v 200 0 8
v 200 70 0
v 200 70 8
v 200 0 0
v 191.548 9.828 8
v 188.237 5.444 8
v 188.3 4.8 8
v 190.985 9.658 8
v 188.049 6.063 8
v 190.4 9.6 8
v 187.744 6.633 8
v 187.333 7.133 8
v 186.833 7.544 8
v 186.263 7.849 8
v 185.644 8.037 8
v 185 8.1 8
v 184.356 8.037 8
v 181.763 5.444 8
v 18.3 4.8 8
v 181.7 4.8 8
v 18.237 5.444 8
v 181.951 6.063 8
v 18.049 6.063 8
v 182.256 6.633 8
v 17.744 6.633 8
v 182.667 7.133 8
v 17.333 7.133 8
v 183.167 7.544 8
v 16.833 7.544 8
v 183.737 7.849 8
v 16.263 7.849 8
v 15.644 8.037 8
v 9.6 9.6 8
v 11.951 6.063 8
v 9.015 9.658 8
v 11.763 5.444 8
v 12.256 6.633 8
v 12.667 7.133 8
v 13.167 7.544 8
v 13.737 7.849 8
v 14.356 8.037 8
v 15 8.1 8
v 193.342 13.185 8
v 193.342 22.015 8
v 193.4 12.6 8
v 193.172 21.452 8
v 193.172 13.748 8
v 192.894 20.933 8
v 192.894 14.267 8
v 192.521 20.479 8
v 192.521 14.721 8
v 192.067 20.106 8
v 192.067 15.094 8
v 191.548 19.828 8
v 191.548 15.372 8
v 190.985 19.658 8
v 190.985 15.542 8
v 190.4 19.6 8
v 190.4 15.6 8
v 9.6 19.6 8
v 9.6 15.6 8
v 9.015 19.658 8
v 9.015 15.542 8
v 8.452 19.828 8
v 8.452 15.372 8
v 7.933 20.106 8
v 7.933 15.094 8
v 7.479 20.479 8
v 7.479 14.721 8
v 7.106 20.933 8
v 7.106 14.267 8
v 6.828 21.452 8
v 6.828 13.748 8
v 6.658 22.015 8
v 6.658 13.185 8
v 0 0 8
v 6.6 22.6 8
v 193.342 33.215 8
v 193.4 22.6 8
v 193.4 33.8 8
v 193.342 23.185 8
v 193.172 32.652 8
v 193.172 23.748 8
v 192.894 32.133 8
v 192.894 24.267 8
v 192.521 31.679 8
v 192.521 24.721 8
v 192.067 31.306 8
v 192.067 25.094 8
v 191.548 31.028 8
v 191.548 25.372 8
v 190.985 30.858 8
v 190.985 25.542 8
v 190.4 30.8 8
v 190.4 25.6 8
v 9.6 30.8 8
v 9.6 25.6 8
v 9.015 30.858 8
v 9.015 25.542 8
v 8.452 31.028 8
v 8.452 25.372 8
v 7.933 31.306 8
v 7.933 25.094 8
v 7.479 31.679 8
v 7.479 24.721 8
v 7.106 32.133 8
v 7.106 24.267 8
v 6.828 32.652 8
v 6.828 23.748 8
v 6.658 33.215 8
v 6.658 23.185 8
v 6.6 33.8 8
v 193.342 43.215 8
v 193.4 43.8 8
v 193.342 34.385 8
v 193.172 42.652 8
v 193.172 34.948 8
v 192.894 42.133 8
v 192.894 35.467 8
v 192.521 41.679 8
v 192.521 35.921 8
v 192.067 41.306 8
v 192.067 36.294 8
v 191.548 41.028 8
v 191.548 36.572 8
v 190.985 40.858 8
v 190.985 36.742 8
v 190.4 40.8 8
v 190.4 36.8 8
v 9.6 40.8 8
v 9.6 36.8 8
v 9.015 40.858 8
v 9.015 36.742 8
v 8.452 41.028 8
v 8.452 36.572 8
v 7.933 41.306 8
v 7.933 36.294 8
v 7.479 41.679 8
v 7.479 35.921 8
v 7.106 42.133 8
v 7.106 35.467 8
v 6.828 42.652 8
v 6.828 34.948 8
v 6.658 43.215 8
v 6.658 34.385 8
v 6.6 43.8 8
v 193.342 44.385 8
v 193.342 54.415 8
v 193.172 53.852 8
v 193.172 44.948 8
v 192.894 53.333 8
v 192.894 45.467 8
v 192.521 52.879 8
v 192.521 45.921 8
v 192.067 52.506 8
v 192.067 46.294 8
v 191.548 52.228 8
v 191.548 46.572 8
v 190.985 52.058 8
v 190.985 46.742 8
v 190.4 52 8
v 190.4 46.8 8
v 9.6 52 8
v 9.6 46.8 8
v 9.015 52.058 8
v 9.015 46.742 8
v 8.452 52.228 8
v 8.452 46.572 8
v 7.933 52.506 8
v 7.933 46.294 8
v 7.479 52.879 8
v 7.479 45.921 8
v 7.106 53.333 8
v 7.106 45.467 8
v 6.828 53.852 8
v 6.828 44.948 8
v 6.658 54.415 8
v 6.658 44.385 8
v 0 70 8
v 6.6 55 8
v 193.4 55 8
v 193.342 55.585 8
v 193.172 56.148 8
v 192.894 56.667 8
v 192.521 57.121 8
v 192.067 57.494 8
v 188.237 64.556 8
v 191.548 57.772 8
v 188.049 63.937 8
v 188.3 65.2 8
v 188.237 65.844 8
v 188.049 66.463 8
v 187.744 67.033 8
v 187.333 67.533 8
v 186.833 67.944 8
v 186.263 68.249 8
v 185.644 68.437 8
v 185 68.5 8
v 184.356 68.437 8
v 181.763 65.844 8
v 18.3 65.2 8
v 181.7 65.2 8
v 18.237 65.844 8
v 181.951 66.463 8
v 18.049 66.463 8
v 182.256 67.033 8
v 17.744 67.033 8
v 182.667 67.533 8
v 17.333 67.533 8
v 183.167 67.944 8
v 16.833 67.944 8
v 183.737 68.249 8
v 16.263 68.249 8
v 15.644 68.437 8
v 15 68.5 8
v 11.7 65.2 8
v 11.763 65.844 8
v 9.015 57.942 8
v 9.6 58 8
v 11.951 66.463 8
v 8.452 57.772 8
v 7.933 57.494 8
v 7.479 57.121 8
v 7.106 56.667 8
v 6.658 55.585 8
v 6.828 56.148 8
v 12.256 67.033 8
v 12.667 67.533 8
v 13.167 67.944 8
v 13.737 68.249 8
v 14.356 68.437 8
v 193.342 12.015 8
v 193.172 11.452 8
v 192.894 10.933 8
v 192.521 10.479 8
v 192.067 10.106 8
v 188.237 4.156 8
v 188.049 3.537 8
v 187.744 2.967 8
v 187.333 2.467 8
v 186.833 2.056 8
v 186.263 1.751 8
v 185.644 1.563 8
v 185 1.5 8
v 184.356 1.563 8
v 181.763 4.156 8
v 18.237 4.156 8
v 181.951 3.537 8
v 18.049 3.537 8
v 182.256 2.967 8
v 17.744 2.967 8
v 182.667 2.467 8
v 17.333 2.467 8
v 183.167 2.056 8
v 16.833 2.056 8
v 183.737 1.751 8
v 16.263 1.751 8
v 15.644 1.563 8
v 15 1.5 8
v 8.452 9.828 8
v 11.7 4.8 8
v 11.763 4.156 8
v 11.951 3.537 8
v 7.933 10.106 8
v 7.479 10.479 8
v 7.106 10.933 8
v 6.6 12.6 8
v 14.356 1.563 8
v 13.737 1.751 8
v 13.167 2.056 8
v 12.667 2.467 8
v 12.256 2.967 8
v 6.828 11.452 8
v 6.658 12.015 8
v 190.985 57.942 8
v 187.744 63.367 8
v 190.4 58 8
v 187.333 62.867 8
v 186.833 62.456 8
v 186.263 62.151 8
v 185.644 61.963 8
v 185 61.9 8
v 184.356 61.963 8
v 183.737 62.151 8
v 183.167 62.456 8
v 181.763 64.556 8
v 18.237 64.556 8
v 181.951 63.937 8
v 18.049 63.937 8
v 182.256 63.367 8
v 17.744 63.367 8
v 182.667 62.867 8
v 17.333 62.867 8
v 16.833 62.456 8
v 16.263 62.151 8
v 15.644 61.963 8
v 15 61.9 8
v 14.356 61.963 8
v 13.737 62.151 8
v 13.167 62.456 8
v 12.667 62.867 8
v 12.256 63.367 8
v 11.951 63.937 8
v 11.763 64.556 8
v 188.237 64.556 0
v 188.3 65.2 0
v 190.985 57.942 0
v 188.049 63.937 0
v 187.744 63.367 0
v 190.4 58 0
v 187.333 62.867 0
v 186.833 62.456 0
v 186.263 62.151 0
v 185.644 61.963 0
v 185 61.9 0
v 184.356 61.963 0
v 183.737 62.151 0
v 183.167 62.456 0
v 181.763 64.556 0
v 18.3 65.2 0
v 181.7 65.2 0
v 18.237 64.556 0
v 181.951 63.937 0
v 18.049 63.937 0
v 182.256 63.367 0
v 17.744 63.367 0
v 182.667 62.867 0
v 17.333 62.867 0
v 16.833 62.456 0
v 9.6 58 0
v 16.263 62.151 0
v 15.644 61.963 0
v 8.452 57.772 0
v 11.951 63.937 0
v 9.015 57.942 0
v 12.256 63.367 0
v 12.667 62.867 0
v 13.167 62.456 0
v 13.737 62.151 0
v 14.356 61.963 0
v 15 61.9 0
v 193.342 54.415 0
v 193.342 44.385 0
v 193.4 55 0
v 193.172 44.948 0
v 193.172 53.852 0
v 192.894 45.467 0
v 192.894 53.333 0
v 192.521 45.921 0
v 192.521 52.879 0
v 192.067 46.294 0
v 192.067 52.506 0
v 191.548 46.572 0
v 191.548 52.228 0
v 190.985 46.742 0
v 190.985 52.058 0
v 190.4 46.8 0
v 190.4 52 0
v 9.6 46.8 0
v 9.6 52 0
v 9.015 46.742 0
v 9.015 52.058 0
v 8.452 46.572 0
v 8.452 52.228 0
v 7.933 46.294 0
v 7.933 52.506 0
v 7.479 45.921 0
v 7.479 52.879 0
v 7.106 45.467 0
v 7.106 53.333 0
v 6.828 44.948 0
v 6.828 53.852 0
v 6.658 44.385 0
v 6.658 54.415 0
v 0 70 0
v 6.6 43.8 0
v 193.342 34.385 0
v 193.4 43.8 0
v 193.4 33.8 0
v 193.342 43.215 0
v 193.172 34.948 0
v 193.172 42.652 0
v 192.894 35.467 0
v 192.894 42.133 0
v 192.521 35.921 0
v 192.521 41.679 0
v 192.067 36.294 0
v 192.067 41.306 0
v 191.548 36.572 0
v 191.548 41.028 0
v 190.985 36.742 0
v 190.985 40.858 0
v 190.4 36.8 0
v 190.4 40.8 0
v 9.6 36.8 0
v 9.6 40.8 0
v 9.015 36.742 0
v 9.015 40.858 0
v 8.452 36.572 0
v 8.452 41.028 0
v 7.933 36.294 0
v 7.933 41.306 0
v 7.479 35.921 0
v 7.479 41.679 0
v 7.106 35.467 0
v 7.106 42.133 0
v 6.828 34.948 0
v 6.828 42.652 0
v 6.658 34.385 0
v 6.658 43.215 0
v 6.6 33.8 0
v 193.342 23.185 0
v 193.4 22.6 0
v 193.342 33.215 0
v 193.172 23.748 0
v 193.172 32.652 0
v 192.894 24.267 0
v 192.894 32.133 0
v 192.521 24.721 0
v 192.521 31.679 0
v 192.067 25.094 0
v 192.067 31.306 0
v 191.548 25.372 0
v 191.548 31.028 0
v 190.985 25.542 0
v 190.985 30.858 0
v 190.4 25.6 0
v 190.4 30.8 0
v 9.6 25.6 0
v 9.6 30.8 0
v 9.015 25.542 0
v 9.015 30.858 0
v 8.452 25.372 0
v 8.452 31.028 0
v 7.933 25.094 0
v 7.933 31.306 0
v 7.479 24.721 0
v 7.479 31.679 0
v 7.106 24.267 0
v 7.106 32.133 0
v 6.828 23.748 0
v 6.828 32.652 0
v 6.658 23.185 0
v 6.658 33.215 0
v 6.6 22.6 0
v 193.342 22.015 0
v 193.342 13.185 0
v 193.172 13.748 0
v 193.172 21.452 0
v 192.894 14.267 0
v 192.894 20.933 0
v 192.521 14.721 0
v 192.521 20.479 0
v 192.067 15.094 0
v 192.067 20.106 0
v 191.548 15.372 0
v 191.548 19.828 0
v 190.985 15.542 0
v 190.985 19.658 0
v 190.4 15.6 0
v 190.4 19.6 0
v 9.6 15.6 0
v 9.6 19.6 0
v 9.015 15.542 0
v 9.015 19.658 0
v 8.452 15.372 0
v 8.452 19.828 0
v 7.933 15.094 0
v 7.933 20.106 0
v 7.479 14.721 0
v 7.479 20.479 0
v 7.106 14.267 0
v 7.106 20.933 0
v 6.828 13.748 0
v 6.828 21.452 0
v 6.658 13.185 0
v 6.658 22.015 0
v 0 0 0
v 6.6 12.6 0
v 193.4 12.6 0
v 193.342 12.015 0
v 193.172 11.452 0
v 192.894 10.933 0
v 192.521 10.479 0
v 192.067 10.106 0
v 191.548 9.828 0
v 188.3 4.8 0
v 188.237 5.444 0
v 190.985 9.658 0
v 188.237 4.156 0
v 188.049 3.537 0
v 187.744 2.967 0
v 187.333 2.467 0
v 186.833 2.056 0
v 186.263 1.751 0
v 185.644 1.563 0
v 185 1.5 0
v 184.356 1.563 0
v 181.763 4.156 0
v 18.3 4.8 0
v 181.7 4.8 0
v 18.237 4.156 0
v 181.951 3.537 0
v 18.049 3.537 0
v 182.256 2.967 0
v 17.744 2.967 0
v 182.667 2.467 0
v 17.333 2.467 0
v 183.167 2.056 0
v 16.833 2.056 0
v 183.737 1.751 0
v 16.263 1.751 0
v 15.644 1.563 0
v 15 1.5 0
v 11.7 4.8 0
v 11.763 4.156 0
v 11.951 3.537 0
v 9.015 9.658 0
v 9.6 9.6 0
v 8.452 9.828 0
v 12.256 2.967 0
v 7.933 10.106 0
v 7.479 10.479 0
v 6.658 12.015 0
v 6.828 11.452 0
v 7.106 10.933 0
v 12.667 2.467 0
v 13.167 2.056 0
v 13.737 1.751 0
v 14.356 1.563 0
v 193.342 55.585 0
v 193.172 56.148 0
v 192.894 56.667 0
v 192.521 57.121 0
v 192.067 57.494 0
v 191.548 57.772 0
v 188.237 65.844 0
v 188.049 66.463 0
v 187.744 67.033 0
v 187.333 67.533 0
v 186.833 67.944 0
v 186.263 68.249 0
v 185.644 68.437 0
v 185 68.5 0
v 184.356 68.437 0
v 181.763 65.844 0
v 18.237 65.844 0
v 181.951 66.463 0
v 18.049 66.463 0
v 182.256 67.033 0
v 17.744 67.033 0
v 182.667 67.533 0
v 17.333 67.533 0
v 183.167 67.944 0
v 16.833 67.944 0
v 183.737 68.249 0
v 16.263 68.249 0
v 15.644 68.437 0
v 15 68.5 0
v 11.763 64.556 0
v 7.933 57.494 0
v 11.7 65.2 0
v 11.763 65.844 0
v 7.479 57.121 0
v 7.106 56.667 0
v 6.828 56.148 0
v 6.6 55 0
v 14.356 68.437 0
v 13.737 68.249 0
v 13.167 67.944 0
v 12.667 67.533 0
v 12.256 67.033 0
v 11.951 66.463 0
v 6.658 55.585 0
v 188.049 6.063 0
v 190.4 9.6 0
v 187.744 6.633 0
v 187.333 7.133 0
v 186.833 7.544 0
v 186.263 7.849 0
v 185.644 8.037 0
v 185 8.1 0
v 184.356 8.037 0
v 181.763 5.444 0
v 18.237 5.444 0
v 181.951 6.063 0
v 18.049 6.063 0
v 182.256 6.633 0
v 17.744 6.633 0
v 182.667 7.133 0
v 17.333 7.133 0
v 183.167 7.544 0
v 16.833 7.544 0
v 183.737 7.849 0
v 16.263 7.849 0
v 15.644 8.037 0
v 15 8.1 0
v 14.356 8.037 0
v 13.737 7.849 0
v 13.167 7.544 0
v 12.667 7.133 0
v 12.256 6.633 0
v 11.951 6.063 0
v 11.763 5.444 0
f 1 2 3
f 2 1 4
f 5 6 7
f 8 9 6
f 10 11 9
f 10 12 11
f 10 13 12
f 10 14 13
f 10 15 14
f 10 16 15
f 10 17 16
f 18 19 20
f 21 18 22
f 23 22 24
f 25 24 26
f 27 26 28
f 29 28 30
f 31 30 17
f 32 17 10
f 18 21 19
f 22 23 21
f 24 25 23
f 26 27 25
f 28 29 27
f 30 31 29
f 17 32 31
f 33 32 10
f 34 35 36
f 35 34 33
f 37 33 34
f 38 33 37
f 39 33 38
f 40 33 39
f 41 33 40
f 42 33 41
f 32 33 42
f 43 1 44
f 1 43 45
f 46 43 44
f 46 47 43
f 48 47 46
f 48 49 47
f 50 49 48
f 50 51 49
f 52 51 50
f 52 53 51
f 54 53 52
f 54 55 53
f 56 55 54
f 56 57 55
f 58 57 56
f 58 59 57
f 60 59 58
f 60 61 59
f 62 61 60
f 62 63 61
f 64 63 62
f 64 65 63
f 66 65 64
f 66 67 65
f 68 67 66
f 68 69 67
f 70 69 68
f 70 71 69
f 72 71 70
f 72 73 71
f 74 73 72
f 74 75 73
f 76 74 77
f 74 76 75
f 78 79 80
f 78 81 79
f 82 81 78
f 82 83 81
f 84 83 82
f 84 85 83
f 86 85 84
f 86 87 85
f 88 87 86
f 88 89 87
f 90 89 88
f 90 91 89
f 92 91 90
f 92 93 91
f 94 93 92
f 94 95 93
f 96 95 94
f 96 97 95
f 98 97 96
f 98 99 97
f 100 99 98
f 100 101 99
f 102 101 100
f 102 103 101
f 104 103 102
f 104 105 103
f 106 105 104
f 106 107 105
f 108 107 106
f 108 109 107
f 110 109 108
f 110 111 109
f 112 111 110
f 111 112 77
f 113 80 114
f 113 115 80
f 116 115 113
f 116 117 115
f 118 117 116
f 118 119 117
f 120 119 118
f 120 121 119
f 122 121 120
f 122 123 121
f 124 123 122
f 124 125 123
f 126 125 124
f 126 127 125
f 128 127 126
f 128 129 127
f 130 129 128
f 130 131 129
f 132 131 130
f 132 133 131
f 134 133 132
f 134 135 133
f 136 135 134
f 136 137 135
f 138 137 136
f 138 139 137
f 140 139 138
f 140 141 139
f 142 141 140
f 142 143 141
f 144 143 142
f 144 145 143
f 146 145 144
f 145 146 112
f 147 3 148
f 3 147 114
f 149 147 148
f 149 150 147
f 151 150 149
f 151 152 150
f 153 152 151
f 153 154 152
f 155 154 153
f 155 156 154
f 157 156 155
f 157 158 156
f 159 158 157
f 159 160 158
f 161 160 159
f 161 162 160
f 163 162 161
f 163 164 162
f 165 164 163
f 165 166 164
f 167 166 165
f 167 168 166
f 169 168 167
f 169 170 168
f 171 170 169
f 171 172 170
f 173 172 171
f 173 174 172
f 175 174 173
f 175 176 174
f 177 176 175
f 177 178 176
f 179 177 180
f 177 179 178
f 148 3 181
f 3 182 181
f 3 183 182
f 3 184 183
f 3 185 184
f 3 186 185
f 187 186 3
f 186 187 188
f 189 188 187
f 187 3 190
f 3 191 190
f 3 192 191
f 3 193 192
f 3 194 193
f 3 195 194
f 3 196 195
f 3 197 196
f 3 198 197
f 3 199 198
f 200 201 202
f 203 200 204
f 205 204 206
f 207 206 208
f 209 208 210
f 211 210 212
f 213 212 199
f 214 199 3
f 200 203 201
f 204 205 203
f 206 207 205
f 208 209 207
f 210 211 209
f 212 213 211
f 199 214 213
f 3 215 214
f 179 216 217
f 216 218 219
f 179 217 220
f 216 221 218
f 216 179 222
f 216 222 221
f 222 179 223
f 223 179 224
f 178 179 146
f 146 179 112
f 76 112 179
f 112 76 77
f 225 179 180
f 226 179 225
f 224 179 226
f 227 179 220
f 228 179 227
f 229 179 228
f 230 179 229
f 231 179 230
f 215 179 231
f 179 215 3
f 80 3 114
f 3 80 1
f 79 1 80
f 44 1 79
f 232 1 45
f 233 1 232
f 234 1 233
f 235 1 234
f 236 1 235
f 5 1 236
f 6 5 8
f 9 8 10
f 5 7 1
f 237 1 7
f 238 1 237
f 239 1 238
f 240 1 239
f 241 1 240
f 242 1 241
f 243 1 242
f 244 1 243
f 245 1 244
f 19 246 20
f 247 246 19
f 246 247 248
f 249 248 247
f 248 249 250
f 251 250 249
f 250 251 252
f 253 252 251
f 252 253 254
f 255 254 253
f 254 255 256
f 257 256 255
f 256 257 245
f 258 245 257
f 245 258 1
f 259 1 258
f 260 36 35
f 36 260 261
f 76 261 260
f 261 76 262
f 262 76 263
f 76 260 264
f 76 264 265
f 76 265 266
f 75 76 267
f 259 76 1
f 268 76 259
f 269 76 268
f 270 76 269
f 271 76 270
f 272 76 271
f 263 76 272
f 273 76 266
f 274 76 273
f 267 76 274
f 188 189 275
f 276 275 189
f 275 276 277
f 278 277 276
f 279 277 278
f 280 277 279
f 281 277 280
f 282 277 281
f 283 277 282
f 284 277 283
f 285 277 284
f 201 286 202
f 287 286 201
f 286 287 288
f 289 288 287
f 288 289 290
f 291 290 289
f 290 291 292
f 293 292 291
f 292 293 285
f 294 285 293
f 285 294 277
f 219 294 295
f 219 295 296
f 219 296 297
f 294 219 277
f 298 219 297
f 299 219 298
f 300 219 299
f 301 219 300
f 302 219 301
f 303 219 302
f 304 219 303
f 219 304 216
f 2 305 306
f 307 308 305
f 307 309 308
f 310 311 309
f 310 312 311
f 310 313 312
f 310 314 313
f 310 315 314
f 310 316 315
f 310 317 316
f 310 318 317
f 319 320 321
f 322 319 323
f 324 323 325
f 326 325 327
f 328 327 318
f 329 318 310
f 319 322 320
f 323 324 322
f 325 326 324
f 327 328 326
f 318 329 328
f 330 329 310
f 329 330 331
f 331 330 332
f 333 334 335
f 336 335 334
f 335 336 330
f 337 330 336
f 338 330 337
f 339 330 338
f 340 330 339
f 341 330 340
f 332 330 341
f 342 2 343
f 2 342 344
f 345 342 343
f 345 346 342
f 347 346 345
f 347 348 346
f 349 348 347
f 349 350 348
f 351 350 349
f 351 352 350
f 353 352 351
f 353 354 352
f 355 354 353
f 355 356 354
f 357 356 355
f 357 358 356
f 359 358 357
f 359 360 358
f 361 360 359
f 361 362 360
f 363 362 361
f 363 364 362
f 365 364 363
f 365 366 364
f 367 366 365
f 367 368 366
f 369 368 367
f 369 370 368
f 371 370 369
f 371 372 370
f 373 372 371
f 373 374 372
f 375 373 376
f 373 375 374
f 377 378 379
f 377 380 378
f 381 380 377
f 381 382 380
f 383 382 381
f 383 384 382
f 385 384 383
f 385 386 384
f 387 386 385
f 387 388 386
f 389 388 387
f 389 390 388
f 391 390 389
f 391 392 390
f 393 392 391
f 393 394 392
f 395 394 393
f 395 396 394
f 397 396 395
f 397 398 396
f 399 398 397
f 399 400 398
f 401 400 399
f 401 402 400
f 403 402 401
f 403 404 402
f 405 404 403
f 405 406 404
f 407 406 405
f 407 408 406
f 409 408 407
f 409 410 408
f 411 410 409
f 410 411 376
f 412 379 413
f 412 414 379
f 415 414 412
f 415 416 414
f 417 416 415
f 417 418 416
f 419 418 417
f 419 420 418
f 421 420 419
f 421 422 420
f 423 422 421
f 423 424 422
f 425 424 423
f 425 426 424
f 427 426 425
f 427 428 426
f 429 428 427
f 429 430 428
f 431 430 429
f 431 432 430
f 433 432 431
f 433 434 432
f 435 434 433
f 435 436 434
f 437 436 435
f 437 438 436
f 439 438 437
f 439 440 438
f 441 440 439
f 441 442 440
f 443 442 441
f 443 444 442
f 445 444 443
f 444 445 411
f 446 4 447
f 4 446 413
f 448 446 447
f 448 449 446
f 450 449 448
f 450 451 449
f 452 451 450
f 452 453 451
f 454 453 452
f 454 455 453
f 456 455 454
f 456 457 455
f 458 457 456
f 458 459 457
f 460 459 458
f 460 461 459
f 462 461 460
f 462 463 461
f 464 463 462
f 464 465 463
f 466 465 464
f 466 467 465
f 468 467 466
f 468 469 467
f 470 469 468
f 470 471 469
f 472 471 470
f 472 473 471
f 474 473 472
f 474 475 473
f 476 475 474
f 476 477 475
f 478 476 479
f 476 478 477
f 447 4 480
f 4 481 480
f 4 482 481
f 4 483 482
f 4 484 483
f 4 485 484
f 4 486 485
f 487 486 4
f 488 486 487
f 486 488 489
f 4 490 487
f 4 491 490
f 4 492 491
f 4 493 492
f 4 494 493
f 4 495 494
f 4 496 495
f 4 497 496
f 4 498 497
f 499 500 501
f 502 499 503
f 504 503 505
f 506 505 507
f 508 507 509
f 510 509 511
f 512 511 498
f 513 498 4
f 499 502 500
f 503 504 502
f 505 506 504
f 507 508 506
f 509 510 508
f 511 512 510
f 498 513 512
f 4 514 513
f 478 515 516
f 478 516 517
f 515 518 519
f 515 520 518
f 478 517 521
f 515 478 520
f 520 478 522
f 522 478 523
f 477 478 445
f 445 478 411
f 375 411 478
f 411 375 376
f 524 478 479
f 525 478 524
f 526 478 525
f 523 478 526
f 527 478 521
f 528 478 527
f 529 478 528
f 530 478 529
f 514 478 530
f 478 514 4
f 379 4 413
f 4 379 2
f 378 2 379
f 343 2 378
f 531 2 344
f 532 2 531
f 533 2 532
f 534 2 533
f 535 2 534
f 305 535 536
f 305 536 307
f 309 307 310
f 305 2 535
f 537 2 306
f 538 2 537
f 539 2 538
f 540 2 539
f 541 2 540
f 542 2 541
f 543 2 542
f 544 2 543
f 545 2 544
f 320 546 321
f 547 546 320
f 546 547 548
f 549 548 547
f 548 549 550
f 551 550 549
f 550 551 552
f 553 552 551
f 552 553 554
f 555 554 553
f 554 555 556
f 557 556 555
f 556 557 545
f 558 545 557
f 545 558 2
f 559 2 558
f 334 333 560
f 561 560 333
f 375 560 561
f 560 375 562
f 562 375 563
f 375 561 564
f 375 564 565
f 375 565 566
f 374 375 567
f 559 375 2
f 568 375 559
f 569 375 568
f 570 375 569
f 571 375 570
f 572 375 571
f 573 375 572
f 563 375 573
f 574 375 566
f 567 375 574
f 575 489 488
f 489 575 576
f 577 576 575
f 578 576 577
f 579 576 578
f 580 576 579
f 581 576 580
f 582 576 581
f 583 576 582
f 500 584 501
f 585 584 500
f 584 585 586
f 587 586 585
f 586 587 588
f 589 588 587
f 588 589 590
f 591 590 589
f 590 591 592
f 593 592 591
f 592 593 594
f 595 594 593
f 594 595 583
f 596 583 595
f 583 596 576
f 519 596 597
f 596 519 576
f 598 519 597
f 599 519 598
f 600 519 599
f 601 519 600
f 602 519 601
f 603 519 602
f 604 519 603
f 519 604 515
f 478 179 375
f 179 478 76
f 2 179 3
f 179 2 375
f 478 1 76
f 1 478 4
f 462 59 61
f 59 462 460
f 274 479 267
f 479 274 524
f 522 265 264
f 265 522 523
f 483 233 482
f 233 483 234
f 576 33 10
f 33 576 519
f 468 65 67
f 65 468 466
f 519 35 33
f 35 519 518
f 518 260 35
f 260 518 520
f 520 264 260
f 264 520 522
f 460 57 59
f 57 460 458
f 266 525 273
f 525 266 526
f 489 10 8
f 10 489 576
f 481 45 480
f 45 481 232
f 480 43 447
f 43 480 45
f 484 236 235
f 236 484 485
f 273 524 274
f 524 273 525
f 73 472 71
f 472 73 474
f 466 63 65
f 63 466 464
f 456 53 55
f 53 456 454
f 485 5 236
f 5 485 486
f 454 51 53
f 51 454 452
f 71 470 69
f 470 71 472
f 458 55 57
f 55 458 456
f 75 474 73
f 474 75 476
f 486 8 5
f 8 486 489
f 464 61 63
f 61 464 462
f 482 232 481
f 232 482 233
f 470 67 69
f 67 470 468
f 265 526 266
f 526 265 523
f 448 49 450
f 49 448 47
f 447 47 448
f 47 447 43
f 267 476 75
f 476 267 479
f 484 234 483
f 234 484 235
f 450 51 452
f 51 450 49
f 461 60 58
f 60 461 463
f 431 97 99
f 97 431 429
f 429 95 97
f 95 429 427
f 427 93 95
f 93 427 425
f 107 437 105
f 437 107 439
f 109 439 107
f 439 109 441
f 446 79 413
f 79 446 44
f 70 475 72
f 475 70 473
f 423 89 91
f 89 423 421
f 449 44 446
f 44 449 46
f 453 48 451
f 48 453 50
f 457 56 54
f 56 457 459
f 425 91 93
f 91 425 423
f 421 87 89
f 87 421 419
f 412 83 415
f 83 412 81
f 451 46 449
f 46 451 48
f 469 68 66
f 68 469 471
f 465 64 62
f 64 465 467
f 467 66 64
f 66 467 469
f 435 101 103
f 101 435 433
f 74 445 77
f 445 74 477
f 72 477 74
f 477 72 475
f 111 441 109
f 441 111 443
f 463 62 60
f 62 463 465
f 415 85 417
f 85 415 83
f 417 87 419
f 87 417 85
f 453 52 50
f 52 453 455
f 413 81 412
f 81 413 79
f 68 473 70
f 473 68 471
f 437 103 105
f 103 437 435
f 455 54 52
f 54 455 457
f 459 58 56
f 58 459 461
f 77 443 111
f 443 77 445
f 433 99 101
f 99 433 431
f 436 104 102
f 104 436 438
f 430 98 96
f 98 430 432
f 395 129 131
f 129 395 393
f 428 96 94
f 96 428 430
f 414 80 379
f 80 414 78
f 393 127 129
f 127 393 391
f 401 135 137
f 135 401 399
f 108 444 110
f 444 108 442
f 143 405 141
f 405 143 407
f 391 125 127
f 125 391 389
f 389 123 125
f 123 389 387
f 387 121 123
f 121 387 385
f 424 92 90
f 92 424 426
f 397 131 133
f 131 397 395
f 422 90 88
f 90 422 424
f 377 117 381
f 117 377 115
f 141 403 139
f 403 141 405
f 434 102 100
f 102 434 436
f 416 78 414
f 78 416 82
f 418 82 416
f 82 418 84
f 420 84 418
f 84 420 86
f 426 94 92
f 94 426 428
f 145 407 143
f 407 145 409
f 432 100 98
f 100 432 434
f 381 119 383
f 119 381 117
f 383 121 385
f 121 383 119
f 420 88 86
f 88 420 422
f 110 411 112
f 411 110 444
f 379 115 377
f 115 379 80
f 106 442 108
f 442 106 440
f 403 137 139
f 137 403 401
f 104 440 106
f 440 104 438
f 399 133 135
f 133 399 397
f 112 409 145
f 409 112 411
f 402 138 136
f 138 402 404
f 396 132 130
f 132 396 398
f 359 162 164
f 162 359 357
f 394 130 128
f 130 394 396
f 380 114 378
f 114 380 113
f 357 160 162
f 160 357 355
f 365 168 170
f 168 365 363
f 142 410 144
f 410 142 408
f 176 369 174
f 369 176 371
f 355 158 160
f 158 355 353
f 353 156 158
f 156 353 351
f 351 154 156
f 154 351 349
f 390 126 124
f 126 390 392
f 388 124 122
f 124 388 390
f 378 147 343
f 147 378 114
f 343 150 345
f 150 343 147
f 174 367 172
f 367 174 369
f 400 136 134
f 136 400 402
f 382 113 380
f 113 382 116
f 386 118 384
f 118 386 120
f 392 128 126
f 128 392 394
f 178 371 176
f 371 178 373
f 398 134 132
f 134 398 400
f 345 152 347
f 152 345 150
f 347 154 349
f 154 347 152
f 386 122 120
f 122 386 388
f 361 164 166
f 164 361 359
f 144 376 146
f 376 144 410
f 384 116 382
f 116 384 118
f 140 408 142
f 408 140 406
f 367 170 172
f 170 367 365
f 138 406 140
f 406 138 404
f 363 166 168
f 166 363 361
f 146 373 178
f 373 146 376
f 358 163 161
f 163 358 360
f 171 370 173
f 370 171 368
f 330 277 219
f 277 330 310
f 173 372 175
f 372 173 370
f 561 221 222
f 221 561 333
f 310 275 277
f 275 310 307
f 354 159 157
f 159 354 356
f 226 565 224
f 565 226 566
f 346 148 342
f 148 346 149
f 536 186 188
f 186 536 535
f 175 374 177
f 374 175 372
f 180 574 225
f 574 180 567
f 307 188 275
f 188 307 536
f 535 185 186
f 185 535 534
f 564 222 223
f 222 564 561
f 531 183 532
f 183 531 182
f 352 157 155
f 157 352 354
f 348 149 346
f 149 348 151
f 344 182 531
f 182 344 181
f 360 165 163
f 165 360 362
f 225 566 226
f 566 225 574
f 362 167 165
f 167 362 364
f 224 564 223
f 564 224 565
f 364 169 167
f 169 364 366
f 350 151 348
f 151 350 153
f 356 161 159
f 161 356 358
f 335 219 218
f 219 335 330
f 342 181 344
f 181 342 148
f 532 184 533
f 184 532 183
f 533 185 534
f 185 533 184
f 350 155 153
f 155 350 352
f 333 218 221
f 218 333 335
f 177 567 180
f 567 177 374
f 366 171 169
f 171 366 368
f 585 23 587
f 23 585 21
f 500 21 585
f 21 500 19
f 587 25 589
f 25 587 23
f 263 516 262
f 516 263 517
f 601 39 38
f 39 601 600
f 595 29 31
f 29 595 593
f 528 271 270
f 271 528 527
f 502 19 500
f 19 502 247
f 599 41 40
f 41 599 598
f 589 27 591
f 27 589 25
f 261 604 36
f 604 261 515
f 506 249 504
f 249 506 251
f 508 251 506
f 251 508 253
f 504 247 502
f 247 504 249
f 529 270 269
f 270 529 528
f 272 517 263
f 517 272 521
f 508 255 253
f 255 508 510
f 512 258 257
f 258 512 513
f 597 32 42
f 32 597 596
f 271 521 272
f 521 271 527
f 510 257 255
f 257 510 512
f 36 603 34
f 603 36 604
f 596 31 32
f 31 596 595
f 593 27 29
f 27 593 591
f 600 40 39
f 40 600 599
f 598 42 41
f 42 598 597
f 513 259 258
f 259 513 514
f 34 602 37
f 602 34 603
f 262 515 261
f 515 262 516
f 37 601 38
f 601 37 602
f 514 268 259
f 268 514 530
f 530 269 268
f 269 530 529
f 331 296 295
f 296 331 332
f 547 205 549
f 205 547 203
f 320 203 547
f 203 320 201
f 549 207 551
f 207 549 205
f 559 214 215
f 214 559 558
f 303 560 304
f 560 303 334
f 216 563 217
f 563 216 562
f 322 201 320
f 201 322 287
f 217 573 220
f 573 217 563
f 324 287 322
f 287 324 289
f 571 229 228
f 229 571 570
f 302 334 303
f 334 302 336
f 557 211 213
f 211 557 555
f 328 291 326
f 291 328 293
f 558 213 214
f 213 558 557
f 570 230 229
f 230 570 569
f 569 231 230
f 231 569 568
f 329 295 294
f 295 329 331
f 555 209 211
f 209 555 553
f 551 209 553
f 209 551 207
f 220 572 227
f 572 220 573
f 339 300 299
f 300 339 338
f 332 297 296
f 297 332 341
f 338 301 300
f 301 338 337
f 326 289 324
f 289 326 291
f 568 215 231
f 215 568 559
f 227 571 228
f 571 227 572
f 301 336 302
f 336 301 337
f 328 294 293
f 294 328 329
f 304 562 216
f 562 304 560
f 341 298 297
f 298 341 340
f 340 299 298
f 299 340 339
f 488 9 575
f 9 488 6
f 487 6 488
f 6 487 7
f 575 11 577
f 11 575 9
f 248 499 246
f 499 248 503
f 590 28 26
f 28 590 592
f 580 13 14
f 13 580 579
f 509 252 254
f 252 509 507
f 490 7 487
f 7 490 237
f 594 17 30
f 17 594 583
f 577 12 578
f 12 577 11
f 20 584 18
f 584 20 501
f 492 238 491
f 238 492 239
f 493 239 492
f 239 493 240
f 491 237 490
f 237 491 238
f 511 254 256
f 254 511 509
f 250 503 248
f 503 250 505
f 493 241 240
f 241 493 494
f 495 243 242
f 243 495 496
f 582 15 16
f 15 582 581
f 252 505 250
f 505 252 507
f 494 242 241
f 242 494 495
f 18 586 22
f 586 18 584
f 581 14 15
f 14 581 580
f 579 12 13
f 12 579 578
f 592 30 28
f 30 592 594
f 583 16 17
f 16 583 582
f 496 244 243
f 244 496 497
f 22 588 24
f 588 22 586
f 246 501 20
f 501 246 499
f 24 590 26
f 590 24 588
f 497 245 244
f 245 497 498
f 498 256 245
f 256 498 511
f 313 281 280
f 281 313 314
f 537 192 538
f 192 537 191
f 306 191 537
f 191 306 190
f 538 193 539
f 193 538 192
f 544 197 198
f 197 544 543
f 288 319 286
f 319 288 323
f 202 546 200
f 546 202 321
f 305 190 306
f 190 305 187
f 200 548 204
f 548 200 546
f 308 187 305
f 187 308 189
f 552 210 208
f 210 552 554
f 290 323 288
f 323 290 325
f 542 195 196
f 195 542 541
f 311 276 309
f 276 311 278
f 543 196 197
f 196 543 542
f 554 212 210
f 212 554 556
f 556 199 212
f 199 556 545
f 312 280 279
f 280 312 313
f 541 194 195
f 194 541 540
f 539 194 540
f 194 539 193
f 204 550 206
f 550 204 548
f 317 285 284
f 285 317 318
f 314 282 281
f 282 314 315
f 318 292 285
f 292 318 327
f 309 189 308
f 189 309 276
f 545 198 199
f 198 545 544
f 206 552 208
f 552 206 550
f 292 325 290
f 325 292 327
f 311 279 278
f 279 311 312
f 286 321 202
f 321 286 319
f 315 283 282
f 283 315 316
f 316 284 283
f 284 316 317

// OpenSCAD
$fn = 32;

// ----------------------------------------------------------------------
// Slotted panel: 200 x 70 mm, 5 рядов of slots
// ----------------------------------------------------------------------

// --- parameters (mm) ---
panel_w = 200;            // panel width
panel_d = 70;             // panel depth
thick = 8;                // panel thickness
slot_w = 6;               // slot width
pitch0 = 10;              // first row pitch
pitch_step = 1.2;         // pitch increase per row
margin = 9.6;             // margin around the slot field
rows = 5;                 // number of slot rows
mount_d = 6.6;            // mounting holes
mount_x = 85;             // mounting hole offset

difference() {
  union() {
    cube([panel_w, panel_d, thick]);
  }
  /* slot rows: stadium shaped cutters, 2.5 mm clear of both faces */
  /* row 0: pitch 10, length 180.8 */
  hull() {
    translate([9.6, 12.6, -2.5]) cylinder(h = thick + 5, d = slot_w);
    translate([190.4, 12.6, -2.5]) cylinder(h = thick + 5, d = slot_w);
  }
  /* row 1: pitch 11.2, length 180.8 */
  hull() {
    translate([9.6, 22.6, -2.5]) cylinder(h = thick + 5, d = slot_w);
    translate([190.4, 22.6, -2.5]) cylinder(h = thick + 5, d = slot_w);
  }
  /* row 2: pitch 10, length 180.8 */
  hull() {
    translate([9.6, 33.8, -2.5]) cylinder(h = thick + 5, d = slot_w);
    translate([190.4, 33.8, -2.5]) cylinder(h = thick + 5, d = slot_w);
  }
  /* row 3: pitch 11.2, length 180.8 */
  hull() {
    translate([9.6, 43.8, -2.5]) cylinder(h = thick + 5, d = slot_w);
    translate([190.4, 43.8, -2.5]) cylinder(h = thick + 5, d = slot_w);
  }
  /* row 4: pitch 10, length 180.8 */
  hull() {
    translate([9.6, 55, -2.5]) cylinder(h = thick + 5, d = slot_w);
    translate([190.4, 55, -2.5]) cylinder(h = thick + 5, d = slot_w);
  }
  translate([15, 4.8, -2.5]) cylinder(h = 13, d = mount_d);
  translate([15, 65.2, -2.5]) cylinder(h = 13, d = mount_d);
  translate([185, 4.8, -2.5]) cylinder(h = 13, d = mount_d);
  translate([185, 65.2, -2.5]) cylinder(h = 13, d = mount_d);
}
